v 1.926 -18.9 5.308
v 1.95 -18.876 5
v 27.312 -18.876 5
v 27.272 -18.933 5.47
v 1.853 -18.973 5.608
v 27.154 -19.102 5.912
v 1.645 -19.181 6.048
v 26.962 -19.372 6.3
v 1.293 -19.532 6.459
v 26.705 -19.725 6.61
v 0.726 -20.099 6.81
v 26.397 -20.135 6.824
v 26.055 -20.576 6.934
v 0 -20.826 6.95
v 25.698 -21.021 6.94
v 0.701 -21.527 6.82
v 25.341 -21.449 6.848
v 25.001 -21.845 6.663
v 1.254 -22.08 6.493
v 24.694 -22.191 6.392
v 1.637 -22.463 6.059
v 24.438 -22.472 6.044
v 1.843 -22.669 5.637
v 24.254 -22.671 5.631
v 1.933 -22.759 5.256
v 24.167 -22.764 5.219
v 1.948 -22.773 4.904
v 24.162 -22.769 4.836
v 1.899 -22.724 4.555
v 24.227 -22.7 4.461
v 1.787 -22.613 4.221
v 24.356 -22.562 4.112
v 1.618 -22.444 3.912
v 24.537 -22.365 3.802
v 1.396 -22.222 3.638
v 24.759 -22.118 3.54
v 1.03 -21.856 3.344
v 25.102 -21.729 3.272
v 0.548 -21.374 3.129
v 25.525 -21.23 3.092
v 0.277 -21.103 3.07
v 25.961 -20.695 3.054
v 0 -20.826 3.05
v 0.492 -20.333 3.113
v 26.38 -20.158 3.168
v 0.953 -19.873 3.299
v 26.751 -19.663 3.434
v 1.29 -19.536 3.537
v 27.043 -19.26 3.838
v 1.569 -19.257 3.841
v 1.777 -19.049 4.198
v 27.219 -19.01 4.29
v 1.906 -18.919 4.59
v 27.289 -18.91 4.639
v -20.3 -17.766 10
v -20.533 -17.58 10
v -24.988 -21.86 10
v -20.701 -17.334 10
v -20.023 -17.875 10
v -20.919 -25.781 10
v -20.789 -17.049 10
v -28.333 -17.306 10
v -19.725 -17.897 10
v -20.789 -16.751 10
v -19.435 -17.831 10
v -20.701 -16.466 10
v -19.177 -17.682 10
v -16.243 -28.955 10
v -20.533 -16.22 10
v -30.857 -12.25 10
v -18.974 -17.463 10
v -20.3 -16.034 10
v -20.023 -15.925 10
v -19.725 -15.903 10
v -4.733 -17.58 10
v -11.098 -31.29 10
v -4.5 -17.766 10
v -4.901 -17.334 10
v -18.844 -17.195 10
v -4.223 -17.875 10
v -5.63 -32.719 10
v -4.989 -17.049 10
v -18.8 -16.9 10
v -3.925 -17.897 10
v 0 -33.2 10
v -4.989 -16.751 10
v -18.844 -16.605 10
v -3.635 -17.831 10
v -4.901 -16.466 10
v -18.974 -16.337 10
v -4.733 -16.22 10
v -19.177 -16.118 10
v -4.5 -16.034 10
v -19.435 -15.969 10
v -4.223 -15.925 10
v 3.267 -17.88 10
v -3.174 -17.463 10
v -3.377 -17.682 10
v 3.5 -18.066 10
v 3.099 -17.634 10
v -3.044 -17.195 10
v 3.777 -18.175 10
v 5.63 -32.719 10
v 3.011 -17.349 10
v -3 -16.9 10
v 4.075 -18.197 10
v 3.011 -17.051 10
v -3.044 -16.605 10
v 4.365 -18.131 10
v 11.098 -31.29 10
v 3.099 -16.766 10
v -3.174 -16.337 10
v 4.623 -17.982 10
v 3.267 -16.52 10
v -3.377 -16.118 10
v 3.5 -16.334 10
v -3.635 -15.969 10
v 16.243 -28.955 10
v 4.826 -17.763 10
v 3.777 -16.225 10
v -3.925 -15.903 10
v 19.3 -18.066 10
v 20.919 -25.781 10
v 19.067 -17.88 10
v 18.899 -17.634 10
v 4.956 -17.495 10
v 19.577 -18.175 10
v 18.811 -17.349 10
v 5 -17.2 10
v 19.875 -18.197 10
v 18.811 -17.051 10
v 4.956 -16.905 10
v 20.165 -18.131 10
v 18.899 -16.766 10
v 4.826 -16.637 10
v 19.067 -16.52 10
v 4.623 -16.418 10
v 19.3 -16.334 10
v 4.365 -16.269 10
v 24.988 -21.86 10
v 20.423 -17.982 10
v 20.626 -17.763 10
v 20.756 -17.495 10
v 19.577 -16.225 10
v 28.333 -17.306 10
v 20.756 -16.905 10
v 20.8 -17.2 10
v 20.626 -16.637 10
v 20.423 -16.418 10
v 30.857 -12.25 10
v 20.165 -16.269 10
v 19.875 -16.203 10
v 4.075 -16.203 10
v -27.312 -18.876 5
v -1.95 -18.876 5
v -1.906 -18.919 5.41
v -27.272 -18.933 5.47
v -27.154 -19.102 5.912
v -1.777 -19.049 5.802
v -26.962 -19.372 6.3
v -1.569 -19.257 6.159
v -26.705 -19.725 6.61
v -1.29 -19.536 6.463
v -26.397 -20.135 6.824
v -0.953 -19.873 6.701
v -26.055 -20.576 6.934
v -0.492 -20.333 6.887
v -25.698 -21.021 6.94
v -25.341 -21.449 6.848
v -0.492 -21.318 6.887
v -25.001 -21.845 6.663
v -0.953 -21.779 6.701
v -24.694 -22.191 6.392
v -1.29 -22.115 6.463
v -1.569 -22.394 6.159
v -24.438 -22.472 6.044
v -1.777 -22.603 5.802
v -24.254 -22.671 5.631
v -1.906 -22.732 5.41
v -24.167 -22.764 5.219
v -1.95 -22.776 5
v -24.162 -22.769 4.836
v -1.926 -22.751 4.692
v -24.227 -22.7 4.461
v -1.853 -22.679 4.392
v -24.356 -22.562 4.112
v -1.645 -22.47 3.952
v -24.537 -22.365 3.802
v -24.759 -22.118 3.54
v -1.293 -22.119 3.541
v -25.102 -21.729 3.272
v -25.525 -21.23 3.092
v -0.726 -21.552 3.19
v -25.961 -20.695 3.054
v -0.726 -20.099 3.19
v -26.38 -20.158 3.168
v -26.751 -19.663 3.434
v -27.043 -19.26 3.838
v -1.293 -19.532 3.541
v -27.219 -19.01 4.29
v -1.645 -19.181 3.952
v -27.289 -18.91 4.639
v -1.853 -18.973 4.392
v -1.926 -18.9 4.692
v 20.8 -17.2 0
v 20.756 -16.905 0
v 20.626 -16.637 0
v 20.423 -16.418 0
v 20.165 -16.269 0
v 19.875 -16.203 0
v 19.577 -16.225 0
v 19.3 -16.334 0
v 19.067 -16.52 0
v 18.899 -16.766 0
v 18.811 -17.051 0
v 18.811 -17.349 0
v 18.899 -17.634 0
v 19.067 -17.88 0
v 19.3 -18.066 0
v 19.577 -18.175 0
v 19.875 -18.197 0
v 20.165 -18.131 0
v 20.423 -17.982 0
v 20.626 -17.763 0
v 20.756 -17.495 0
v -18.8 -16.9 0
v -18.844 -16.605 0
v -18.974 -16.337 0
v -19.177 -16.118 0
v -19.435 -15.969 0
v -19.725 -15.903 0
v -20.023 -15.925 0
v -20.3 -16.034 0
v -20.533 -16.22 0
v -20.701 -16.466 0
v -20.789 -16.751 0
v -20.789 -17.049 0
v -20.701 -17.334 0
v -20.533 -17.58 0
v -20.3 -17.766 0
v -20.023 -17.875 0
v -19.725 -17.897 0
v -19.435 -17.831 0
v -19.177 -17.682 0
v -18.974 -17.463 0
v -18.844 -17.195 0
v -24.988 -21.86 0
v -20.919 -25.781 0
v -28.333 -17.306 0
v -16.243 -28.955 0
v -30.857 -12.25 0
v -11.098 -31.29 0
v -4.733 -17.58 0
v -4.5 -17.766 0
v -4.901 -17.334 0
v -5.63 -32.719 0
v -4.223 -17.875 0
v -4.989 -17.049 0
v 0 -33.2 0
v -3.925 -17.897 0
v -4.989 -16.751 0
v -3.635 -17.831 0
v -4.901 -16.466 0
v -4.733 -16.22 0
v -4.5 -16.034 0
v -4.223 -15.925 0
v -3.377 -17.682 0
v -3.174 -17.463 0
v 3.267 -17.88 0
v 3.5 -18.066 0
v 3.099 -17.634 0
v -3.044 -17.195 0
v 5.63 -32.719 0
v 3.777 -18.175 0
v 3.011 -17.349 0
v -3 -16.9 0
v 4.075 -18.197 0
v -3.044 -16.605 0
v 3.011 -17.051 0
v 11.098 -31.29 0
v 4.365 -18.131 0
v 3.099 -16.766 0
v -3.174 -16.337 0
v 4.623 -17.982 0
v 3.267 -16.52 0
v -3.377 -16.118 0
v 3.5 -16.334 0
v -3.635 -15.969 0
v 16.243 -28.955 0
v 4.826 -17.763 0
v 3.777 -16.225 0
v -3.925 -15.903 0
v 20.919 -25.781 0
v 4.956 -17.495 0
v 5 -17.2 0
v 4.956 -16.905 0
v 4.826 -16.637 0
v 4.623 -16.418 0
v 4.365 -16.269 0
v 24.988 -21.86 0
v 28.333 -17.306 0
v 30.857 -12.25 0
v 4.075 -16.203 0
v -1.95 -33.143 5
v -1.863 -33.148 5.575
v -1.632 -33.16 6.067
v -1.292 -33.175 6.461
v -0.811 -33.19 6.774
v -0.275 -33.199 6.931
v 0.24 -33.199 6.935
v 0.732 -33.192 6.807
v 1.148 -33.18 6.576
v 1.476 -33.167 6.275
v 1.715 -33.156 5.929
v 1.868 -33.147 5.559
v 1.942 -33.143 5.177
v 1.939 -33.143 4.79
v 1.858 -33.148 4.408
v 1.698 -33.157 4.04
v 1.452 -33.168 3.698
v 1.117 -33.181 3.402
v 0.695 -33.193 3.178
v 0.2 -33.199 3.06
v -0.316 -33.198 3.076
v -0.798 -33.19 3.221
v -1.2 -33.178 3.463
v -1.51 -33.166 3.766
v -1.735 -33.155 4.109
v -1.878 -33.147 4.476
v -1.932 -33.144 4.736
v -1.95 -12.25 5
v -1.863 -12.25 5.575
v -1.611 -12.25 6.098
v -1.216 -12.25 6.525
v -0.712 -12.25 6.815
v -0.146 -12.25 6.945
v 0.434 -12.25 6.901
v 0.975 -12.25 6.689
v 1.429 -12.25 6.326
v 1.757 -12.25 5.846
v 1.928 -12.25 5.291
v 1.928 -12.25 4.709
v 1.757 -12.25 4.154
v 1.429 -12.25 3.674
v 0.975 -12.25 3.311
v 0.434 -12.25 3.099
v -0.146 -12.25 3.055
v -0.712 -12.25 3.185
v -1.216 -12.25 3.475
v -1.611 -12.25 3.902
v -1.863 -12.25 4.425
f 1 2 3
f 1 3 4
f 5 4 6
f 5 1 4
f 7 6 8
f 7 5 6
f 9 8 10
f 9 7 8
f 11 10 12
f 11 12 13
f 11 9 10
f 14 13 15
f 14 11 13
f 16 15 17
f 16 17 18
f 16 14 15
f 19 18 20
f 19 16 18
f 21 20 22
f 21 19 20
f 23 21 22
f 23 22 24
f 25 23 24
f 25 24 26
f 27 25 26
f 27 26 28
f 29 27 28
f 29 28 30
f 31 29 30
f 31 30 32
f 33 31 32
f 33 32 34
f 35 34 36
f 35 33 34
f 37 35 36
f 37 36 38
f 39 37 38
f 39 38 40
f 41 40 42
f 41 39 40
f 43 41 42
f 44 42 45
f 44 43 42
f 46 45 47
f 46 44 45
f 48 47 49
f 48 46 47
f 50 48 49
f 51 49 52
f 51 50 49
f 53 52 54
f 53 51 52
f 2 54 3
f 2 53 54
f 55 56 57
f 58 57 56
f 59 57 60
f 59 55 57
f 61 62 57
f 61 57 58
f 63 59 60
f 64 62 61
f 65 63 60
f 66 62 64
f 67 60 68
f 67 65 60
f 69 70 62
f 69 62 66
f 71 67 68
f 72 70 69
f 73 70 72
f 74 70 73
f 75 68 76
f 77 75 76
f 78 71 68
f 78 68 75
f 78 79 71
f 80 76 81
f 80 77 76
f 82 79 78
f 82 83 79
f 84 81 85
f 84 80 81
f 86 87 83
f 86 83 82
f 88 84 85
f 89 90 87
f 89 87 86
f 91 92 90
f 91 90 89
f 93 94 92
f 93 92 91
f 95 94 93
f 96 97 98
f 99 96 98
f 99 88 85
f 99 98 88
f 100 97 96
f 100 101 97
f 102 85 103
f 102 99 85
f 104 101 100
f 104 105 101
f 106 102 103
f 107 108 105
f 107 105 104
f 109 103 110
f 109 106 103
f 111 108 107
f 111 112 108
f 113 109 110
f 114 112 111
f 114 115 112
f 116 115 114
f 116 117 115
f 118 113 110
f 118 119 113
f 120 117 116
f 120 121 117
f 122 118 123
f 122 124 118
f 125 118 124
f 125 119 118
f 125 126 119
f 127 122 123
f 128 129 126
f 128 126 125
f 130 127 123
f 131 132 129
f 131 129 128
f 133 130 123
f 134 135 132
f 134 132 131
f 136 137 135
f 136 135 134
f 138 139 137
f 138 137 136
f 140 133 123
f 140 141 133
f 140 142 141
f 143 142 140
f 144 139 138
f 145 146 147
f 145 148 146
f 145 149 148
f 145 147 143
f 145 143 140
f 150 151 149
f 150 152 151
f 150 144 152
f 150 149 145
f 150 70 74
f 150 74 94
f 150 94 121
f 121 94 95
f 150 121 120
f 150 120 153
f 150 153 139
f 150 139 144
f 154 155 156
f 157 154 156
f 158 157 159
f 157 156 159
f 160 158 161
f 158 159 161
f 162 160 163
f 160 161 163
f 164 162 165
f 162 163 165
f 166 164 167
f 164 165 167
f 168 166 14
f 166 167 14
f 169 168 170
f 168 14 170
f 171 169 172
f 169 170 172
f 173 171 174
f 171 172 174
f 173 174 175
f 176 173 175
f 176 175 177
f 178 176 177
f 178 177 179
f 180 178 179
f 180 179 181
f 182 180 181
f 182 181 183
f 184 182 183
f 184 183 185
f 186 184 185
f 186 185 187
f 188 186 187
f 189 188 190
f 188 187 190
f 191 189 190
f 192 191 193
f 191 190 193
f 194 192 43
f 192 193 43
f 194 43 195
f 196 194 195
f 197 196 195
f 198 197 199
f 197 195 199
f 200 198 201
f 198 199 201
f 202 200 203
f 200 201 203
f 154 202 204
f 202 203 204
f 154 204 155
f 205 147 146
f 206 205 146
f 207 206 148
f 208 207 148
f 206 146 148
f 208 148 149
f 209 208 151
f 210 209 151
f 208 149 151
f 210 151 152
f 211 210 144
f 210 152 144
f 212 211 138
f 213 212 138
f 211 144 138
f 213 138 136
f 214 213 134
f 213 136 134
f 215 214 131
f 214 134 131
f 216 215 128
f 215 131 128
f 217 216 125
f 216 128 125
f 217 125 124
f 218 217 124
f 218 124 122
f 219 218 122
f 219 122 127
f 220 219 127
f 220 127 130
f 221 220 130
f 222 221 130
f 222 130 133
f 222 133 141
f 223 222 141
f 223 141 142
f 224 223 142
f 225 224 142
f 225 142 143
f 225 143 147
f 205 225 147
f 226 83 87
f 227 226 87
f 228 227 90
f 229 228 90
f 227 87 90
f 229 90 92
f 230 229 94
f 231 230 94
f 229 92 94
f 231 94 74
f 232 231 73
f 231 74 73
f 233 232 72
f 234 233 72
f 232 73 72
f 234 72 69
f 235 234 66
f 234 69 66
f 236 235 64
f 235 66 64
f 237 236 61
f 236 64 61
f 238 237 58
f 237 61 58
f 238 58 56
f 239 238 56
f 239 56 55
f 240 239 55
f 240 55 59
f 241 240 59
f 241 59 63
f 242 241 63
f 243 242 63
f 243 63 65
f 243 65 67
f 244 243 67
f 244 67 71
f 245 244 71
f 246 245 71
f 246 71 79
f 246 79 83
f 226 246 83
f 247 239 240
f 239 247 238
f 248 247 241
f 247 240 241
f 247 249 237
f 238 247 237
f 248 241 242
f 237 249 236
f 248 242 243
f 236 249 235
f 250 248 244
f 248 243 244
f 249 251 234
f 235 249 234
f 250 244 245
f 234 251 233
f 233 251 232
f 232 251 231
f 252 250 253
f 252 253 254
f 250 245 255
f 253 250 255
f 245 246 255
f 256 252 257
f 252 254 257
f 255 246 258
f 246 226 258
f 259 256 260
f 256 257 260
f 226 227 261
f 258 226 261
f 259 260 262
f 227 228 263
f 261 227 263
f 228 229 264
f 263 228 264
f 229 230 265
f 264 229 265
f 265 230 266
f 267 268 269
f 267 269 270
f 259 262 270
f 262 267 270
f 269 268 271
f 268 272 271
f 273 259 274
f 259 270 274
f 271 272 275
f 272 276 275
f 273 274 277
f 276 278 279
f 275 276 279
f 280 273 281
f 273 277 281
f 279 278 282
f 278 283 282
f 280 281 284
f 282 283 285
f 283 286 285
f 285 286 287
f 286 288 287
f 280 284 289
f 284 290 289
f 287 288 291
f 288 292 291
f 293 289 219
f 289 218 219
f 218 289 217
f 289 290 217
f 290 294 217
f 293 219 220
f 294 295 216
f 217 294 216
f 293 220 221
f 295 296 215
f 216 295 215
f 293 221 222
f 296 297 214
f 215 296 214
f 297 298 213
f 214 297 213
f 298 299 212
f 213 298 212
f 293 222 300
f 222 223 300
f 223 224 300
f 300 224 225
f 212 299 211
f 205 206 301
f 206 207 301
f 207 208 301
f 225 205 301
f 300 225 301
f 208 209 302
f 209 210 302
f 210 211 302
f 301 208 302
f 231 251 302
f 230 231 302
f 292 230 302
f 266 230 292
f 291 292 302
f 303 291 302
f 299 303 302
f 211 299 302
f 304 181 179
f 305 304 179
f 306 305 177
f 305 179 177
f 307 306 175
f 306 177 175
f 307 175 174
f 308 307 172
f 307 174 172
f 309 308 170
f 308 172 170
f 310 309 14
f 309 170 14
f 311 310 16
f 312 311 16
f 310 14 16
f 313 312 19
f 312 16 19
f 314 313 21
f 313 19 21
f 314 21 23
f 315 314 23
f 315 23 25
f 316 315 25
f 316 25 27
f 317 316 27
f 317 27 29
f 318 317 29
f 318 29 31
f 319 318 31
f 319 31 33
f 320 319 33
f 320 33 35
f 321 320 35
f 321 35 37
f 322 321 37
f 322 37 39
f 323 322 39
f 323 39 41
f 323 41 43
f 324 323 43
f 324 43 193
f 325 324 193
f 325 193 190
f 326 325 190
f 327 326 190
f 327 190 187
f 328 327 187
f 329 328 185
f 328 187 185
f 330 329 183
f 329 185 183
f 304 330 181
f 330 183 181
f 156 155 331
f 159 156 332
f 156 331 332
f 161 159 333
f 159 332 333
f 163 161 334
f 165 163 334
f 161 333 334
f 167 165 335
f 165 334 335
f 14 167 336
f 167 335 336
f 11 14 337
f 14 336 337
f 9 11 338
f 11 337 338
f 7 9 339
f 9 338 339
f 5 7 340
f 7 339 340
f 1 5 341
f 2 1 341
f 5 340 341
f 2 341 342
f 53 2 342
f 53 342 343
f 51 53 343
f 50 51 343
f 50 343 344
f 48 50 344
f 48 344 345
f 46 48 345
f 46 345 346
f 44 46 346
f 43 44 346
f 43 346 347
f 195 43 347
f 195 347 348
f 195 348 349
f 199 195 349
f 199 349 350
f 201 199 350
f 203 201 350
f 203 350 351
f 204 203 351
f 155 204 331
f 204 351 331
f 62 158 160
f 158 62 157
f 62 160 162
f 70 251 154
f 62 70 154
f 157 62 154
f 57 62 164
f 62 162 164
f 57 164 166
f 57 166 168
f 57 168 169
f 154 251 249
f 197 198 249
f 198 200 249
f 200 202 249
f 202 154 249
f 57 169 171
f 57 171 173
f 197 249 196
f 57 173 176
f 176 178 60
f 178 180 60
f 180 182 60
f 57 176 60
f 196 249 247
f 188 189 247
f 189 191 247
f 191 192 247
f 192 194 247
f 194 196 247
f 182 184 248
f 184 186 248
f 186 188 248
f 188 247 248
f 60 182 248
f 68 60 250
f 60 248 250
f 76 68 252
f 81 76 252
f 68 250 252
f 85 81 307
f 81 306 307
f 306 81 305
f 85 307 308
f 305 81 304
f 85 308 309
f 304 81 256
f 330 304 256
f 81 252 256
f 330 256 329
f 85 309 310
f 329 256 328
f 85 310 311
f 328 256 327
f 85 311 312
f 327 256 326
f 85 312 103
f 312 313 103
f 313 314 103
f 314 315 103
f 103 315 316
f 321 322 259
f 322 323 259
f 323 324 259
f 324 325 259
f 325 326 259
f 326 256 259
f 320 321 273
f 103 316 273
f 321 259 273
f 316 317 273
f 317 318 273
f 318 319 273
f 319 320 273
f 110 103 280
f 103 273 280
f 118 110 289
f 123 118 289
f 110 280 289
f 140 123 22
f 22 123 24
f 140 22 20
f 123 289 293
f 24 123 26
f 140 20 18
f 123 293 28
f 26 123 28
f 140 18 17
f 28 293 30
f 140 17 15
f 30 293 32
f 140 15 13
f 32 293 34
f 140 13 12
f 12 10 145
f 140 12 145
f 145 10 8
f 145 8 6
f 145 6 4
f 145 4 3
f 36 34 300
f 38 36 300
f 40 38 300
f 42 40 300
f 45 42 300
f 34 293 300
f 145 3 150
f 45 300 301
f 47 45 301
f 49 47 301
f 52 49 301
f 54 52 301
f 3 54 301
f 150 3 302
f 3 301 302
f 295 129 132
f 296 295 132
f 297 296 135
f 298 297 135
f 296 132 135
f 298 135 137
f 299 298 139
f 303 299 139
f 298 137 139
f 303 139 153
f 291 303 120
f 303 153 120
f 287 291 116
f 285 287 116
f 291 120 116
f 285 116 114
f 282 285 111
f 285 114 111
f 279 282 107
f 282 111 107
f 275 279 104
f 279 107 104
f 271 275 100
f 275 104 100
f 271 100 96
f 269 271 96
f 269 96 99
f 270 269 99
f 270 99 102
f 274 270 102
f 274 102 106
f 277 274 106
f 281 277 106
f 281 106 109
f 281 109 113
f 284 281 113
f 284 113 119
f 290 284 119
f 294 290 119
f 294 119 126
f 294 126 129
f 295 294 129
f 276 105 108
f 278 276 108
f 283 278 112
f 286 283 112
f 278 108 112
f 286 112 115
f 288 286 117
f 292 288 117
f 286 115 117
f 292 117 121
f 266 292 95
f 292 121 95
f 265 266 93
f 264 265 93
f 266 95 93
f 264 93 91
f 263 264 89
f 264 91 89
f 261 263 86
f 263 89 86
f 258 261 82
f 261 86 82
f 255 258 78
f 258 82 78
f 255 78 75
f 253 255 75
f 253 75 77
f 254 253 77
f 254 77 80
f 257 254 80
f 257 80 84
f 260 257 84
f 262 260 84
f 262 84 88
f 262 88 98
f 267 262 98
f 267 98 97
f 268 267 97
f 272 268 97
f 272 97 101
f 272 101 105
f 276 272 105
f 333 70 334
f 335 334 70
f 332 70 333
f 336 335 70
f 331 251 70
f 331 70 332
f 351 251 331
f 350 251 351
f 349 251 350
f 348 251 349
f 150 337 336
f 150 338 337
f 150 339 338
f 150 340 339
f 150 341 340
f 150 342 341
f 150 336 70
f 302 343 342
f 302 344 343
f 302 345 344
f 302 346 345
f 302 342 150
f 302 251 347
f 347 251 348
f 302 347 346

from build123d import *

# Parameters (mm, degrees)
PAD003_DEPTH         = 10
SKETCH004_R          = 1
POCKET_DEPTH         = 10.001
SKETCH006_R          = 1.95
POCKET002_DEPTH      = 20.951
SKETCH007_R          = 1.95
POCKET003_DEPTH      = 100
POCKET003_DEPTH_BACK = 100


with BuildPart() as part:
    # Sketch003 → Pad003 (new body)
    with BuildSketch(Plane.XY):
        with BuildLine():
            ThreePointArc((-30.857374, -12.25), (0, -33.2), (30.857374, -12.25))
            Line((-30.857374, -12.25), (30.857374, -12.25))
        make_face()
    extrude(amount=PAD003_DEPTH)

    # Sketch004 (on Face4 of Pad003) → Pocket (cut, through all)
    with BuildSketch(Plane.XY.offset(10)):
        with Locations((4, -17.2)):
            Circle(SKETCH004_R)
        with Locations((19.8, -17.2)):
            Circle(SKETCH004_R)
        with Locations((-4, -16.9)):
            Circle(SKETCH004_R)
        with Locations((-19.8, -16.9)):
            Circle(SKETCH004_R)
    extrude(amount=-POCKET_DEPTH, mode=Mode.SUBTRACT)

    # Sketch006 (on Face2 of Pocket) → Pocket002 (cut, through all)
    with BuildSketch(Plane(origin=(0, -12.25, 0), x_dir=(-1, 0, 0), z_dir=(0, 1, 0))):
        with Locations((0, 5)):
            Circle(SKETCH006_R)
    extrude(amount=-POCKET002_DEPTH, mode=Mode.SUBTRACT)

    # Sketch007 → Pocket003 (cut, two sides)
    with BuildSketch(Plane.YZ) as pocket003_sk:
        with Locations((-20.825799, 5)):
            Circle(SKETCH007_R)
    extrude(amount=-POCKET003_DEPTH, mode=Mode.SUBTRACT)
    extrude(pocket003_sk.sketch, amount=POCKET003_DEPTH_BACK, mode=Mode.SUBTRACT)


solid = part.part
